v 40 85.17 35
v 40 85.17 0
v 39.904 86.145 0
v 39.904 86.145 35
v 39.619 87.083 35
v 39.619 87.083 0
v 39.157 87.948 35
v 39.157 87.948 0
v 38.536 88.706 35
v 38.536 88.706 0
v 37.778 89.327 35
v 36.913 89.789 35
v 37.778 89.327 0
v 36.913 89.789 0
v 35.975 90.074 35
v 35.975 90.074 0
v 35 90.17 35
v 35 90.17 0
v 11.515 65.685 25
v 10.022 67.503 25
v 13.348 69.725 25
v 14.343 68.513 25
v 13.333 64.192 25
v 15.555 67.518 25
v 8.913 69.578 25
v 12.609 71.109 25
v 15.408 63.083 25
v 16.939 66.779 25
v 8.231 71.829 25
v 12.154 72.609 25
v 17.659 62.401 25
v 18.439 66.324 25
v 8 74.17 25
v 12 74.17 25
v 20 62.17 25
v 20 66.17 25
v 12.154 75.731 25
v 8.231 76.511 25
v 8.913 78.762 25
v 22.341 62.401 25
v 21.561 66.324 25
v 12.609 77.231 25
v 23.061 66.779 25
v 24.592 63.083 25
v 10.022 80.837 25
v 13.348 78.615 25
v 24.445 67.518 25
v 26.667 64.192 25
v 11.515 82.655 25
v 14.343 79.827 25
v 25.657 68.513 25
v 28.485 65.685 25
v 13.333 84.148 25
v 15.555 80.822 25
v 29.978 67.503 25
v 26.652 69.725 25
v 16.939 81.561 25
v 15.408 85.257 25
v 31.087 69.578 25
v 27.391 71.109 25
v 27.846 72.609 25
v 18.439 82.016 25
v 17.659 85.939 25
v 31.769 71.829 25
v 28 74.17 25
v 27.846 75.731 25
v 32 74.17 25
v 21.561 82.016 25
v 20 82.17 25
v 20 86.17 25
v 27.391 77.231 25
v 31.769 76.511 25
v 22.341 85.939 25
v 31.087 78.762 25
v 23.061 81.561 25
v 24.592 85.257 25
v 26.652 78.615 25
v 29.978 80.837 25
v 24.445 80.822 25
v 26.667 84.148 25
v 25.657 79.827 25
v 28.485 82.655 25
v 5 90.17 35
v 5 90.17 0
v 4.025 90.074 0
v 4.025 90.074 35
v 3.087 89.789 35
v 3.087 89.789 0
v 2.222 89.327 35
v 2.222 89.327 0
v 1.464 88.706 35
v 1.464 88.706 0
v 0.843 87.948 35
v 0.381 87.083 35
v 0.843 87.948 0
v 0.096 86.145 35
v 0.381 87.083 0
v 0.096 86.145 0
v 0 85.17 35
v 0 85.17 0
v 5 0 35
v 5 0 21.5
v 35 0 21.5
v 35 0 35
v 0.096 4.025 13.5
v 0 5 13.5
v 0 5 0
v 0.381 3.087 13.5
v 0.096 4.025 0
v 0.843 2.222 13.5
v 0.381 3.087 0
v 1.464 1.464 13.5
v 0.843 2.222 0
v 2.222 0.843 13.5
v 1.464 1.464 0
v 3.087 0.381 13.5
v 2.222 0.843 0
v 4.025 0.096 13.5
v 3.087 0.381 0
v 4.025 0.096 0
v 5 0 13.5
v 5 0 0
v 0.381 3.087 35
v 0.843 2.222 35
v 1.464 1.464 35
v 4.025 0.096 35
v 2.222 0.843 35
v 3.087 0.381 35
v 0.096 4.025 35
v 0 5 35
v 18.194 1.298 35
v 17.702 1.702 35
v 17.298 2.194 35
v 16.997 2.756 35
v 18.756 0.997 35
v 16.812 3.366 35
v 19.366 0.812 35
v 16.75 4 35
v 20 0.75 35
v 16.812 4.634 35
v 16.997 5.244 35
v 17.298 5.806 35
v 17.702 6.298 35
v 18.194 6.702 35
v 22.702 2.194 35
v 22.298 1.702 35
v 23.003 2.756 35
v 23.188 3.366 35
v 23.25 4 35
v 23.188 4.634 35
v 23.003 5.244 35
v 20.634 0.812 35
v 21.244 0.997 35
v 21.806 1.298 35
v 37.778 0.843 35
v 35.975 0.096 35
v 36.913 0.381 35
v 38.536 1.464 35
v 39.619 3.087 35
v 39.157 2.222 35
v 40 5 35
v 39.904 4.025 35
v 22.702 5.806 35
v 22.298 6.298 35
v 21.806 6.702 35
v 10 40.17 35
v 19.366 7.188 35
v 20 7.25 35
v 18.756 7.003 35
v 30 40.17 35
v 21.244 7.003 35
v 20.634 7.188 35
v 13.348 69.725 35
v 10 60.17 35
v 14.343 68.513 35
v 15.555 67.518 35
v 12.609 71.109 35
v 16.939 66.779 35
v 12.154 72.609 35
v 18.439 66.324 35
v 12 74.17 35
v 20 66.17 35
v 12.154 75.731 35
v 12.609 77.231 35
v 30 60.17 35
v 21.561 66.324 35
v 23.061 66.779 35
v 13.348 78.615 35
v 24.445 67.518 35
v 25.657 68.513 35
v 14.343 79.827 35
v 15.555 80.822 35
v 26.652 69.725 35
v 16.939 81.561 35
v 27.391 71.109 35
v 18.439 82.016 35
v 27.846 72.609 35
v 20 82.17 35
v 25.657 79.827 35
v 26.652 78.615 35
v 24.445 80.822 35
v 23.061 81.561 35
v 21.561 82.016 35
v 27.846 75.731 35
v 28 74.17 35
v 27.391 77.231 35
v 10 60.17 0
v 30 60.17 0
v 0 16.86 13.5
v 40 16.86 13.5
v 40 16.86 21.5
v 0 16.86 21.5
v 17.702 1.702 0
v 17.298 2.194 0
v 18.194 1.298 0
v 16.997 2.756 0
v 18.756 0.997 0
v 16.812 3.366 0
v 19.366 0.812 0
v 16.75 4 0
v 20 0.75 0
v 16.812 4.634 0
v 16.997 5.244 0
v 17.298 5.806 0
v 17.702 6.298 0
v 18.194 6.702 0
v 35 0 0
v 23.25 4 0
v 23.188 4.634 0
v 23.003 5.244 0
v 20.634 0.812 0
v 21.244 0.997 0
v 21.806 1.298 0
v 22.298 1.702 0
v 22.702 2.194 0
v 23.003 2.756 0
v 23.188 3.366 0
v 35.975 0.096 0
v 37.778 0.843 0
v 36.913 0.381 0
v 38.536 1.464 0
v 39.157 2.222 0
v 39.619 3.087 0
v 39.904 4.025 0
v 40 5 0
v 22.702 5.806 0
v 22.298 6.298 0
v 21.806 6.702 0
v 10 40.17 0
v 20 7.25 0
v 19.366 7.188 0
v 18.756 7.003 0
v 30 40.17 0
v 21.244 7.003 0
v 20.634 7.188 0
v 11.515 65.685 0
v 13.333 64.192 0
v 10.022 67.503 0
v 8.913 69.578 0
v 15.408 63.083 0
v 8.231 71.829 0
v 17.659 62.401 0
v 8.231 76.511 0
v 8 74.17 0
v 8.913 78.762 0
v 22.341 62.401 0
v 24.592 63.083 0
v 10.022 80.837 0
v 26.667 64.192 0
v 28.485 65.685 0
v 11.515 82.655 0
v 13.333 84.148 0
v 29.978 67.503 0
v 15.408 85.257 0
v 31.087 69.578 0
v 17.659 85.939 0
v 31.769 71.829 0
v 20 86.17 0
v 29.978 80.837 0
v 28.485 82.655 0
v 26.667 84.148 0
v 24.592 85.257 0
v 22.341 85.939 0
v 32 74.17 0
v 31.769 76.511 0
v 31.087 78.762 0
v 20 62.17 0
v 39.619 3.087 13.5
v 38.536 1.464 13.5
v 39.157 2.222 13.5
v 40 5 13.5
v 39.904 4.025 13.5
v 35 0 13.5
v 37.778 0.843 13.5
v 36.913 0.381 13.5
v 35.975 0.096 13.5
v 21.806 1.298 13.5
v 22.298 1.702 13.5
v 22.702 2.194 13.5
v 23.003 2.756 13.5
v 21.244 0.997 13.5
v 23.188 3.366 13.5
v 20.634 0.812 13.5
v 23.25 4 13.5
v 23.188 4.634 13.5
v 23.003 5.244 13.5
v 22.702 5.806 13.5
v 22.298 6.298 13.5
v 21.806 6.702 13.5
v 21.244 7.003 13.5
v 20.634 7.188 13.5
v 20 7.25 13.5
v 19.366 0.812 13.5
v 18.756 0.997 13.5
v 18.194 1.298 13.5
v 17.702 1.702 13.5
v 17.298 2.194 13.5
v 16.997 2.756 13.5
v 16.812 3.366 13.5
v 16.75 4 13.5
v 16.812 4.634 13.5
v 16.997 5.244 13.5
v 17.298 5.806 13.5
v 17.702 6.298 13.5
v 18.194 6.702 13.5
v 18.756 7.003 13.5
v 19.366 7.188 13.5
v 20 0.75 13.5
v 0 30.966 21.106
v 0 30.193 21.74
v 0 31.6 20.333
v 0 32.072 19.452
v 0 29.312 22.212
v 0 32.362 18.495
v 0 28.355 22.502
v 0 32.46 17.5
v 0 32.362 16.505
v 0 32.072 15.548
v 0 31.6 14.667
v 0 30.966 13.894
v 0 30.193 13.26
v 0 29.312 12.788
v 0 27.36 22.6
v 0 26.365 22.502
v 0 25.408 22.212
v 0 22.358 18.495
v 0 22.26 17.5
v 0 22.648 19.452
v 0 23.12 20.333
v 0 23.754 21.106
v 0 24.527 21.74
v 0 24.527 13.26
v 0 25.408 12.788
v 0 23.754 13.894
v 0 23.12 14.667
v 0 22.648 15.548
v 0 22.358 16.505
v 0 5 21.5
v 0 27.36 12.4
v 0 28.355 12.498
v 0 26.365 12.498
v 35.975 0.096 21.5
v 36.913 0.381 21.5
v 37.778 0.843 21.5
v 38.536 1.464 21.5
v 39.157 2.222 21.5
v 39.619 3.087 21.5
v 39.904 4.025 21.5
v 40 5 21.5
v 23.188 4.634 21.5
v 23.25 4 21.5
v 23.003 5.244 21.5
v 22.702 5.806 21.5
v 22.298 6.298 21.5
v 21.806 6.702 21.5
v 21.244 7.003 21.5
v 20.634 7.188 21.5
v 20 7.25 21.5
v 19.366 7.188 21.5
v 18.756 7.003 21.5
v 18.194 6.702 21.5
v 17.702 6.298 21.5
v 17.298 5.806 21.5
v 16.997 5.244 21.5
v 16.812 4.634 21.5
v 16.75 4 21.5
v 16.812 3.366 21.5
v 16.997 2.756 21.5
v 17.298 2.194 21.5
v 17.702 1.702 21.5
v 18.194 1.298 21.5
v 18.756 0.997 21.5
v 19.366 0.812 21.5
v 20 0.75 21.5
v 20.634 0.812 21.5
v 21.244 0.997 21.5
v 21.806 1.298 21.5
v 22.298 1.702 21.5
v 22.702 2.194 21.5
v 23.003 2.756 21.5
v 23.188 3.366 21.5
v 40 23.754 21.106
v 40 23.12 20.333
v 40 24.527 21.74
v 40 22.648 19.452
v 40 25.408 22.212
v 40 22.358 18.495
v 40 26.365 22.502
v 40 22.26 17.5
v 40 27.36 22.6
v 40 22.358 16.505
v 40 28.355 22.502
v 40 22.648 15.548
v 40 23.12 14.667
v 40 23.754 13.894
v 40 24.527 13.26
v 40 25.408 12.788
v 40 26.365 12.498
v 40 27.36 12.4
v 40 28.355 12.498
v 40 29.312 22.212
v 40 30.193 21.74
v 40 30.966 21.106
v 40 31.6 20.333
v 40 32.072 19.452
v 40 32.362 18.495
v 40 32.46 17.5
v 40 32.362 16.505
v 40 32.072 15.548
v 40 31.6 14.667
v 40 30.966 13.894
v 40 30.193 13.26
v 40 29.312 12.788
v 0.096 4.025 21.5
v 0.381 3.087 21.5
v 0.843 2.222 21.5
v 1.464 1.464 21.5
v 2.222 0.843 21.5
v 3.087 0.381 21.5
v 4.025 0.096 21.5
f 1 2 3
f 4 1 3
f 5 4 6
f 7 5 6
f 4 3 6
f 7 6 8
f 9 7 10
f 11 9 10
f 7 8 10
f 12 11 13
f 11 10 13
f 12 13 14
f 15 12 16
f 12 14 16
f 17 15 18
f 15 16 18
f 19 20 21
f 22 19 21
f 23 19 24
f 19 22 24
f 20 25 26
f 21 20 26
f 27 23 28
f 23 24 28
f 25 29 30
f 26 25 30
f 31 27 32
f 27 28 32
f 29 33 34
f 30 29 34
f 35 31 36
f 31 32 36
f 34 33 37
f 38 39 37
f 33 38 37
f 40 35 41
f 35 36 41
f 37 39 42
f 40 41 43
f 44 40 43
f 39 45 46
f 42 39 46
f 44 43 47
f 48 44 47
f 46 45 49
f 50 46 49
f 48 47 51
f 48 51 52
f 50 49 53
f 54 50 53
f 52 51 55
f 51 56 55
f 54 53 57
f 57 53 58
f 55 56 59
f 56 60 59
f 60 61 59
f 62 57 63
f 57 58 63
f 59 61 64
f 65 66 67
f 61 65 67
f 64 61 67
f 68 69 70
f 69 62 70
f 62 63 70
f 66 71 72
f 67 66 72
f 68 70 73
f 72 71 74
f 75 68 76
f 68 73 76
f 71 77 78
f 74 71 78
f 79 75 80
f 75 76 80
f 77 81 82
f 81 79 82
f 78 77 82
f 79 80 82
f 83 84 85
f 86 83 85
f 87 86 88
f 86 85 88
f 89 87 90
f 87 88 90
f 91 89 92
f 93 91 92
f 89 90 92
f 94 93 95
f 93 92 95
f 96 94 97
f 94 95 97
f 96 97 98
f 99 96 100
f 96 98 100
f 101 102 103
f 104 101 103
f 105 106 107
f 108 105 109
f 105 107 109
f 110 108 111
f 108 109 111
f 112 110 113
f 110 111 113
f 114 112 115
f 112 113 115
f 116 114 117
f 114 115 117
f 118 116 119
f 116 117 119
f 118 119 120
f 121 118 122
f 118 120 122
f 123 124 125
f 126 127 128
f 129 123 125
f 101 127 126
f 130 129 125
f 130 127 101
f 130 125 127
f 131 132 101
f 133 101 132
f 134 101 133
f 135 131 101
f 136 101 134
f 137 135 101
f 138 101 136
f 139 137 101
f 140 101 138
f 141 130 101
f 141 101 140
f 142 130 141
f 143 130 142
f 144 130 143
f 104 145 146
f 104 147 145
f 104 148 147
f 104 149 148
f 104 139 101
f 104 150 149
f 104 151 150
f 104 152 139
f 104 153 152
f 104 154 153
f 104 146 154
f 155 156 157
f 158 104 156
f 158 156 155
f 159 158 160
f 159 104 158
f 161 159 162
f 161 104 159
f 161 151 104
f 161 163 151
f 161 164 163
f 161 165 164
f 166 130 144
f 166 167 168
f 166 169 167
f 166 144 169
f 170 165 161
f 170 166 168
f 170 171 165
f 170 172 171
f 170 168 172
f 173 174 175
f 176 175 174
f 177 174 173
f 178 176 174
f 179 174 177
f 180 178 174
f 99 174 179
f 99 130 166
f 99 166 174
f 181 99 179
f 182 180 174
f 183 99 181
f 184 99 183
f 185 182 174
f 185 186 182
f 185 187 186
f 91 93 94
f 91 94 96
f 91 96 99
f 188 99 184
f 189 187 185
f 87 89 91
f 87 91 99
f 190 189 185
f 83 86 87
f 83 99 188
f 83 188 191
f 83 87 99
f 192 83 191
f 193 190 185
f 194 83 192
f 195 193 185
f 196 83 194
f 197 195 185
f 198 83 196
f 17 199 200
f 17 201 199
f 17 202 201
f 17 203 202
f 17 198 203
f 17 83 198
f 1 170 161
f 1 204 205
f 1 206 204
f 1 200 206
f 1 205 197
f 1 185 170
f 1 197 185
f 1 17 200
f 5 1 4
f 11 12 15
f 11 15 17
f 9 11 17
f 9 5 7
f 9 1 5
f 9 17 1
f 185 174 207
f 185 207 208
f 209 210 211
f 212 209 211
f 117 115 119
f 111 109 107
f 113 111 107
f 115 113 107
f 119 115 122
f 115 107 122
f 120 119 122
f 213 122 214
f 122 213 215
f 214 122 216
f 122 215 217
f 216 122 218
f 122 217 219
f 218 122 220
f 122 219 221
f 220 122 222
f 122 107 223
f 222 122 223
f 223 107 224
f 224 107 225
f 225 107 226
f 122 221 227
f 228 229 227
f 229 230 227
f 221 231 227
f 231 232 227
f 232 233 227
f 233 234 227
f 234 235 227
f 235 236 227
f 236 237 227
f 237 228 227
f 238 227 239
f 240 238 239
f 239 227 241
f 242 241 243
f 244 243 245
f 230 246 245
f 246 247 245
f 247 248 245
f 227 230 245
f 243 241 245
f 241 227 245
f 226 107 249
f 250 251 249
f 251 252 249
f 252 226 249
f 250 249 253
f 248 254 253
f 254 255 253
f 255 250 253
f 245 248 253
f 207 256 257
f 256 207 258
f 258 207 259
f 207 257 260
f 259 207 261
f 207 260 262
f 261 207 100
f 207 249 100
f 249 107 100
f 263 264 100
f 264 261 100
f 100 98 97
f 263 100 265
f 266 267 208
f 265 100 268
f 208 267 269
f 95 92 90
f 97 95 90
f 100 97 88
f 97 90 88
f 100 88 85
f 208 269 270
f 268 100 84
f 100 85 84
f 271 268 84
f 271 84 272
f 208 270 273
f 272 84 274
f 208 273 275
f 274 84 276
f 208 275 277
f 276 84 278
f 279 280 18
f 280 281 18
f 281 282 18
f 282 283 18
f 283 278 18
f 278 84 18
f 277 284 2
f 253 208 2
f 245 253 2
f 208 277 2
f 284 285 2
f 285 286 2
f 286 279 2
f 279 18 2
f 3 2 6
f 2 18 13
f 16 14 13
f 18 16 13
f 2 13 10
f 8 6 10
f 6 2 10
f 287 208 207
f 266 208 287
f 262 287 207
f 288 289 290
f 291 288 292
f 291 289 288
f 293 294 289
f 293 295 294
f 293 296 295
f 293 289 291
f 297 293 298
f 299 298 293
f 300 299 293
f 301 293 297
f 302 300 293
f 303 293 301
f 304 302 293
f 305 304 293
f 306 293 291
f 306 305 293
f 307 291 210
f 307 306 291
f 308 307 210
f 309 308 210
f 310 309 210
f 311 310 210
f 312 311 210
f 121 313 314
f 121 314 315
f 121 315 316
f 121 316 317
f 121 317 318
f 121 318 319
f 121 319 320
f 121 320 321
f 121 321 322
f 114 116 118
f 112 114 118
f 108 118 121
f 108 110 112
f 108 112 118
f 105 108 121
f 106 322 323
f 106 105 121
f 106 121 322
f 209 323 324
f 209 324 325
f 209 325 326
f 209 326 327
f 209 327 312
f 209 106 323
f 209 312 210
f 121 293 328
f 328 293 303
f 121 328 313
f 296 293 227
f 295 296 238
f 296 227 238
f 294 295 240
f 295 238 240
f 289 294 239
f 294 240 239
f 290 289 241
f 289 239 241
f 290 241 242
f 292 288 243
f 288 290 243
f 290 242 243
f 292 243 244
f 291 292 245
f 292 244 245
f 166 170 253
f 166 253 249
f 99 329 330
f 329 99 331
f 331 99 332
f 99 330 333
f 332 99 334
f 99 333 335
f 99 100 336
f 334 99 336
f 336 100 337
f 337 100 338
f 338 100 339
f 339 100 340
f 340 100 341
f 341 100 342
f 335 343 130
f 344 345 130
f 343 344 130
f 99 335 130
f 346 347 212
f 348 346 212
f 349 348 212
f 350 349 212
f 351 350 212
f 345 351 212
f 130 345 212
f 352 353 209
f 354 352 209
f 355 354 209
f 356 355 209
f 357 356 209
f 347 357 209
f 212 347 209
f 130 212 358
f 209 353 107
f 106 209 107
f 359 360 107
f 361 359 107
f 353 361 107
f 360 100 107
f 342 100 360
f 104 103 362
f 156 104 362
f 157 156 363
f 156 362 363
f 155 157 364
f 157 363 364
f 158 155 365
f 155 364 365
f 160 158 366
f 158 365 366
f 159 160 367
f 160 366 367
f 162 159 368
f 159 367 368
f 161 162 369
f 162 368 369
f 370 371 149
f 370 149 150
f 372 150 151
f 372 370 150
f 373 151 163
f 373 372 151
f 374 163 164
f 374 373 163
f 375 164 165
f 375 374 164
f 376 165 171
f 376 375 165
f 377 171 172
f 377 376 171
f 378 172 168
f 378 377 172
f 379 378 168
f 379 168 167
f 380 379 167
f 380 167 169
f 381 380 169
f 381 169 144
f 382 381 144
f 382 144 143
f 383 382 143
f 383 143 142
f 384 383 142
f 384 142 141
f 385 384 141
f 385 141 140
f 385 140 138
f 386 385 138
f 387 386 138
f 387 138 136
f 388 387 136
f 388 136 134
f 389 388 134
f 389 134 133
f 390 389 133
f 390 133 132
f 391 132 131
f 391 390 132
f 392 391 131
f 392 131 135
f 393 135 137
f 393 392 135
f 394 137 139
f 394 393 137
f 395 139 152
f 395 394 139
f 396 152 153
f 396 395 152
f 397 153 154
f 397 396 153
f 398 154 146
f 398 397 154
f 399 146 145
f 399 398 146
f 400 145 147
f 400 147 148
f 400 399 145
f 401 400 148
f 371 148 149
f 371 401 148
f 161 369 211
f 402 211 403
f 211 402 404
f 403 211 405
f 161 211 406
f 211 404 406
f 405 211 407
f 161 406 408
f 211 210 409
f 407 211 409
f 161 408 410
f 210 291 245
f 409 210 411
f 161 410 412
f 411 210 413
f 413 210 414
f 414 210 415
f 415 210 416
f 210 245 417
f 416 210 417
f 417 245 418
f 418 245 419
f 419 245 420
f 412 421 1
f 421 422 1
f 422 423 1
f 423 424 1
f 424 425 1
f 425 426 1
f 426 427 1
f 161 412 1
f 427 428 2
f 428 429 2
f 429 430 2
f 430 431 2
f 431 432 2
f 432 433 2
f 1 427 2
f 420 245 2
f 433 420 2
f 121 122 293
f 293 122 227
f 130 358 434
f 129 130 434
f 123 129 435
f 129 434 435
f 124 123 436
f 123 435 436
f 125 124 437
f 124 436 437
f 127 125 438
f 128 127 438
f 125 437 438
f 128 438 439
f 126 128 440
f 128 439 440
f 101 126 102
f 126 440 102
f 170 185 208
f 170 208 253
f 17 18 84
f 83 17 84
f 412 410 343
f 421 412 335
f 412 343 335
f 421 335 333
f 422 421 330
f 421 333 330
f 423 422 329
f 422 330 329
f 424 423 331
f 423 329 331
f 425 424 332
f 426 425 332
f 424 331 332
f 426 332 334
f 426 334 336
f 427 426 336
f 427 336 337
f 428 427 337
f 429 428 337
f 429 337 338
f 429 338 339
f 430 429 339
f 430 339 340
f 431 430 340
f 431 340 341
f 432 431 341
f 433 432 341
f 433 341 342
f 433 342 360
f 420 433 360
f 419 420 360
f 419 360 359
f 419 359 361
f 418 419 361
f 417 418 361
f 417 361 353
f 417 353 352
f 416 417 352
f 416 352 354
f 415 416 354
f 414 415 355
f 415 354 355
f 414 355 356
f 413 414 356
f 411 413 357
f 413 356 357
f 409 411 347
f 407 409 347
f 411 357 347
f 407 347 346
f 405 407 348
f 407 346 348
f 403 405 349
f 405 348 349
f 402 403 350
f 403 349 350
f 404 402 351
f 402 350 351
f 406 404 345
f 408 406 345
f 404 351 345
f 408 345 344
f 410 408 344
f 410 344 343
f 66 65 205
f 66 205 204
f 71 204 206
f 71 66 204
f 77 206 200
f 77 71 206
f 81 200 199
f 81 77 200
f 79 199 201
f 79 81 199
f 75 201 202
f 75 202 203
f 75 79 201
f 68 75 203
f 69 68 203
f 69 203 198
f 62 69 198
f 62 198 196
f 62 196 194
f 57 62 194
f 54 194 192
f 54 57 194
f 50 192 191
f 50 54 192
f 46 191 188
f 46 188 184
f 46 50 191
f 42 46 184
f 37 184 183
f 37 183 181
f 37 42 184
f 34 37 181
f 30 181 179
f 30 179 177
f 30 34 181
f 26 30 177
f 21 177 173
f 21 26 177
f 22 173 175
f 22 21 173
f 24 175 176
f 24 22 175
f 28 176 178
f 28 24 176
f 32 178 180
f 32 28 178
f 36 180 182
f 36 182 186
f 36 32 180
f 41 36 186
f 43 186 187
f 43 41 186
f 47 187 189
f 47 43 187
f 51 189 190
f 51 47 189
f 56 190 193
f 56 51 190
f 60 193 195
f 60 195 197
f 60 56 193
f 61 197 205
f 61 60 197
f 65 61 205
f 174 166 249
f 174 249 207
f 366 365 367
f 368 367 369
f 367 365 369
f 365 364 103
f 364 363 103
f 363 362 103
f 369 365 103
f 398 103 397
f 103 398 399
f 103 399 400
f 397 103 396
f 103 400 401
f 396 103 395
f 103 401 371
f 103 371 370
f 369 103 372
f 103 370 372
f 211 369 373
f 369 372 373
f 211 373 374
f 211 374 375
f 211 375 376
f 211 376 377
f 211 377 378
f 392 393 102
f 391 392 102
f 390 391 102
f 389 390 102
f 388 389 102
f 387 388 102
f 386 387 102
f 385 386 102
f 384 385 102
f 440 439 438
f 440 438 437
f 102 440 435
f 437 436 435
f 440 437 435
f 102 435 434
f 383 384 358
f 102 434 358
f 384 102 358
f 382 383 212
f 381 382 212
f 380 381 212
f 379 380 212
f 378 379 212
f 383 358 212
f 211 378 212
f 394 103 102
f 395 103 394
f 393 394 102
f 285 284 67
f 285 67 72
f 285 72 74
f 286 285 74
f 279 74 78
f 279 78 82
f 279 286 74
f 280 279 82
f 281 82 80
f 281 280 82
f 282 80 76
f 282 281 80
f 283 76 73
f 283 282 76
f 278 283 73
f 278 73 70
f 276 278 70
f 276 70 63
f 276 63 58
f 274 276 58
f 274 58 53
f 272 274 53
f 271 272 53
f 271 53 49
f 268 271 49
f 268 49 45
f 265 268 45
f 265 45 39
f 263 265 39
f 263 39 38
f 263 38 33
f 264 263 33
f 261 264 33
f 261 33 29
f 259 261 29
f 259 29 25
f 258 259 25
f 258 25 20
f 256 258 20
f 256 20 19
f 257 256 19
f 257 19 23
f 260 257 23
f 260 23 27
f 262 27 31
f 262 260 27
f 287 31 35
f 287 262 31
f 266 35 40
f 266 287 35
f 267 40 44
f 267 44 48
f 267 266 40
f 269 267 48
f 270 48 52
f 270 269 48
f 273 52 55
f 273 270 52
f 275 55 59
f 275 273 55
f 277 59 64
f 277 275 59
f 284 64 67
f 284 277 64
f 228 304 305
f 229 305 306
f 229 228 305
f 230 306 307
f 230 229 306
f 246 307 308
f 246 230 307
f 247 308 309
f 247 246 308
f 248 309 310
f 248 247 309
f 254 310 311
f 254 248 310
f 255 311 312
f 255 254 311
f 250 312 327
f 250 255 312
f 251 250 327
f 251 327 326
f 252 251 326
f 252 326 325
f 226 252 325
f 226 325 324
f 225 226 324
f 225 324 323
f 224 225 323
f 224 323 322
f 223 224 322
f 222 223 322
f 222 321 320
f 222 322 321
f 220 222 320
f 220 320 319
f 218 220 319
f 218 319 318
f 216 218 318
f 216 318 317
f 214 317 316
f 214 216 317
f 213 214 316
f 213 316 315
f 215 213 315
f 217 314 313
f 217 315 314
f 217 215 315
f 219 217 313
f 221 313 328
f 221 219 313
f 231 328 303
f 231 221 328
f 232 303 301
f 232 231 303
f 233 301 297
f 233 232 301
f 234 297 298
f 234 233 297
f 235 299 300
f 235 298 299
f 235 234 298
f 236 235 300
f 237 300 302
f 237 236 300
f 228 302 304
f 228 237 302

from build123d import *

# Parameters (mm, degrees)
CROQUIS1_R              = 12
CROQUIS1_R_2            = 3.25
SALIENTE_EXTRUIR1_DEPTH = 35
SALIENTE_EXTRUIR2_START = -10
CROQUIS2_R              = 12
CROQUIS2_R_2            = 8
SALIENTE_EXTRUIR2_DEPTH = 10
CROQUIS3_R              = 5.1
CROQUIS3_W              = 8
CROQUIS3_H              = 16.86
CORTAR_EXTRUIR2_DEPTH   = 105.669140151


with BuildPart() as part:
    # Croquis1 → Saliente-Extruir1 (new body)
    # profile 1 of 2: a face of its own
    with BuildSketch(Plane.XY):
        with BuildLine():
            Line((0, 85.17), (0, 40.17))
            Line((0, 40.17), (10, 40.17))
            Line((10, 40.17), (10, 60.17))
            Line((10, 60.17), (30, 60.17))
            Line((30, 60.17), (30, 40.17))
            Line((30, 40.17), (40, 40.17))
            Line((40, 40.17), (40, 85.17))
            ThreePointArc((40, 85.17), (38.535533906, 88.705533906), (35, 90.17))
            Line((35, 90.17), (5, 90.17))
            ThreePointArc((5, 90.17), (1.464466094, 88.705533906), (0, 85.17))
        make_face()
        with Locations((20, 74.17)):
            Circle(CROQUIS1_R, mode=Mode.SUBTRACT)
    # profile 2 of 2: a face of its own
    with BuildSketch(Plane.XY):
        with BuildLine():
            Line((5, 0), (35, 0))
            ThreePointArc((35, 0), (38.535533906, 1.464466094), (40, 5))
            Line((40, 5), (40, 40.17))
            Line((40, 40.17), (0, 40.17))
            Line((0, 40.17), (0, 5))
            ThreePointArc((0, 5), (1.464466094, 1.464466094), (5, 0))
        make_face()
        with Locations((20, 4)):
            Circle(CROQUIS1_R_2, mode=Mode.SUBTRACT)
    extrude(amount=SALIENTE_EXTRUIR1_DEPTH)

    # Croquis2 → Saliente-Extruir2 (add)
    with BuildSketch(Plane.XY.offset(35).offset(SALIENTE_EXTRUIR2_START)):
        with Locations((20, 74.17)):
            Circle(CROQUIS2_R)
        with Locations((20, 74.17)):
            Circle(CROQUIS2_R_2, mode=Mode.SUBTRACT)
    extrude(amount=SALIENTE_EXTRUIR2_DEPTH)

    # Croquis3 → Cortar-Extruir2 (cut, through all)
    with BuildSketch(Plane.ZY):
        with Locations((17.5, 27.36)):
            Circle(CROQUIS3_R)
        with Locations((17.5, 8.43)):
            Rectangle(CROQUIS3_W, CROQUIS3_H)
    extrude(amount=-CORTAR_EXTRUIR2_DEPTH, mode=Mode.SUBTRACT)


solid = part.part
